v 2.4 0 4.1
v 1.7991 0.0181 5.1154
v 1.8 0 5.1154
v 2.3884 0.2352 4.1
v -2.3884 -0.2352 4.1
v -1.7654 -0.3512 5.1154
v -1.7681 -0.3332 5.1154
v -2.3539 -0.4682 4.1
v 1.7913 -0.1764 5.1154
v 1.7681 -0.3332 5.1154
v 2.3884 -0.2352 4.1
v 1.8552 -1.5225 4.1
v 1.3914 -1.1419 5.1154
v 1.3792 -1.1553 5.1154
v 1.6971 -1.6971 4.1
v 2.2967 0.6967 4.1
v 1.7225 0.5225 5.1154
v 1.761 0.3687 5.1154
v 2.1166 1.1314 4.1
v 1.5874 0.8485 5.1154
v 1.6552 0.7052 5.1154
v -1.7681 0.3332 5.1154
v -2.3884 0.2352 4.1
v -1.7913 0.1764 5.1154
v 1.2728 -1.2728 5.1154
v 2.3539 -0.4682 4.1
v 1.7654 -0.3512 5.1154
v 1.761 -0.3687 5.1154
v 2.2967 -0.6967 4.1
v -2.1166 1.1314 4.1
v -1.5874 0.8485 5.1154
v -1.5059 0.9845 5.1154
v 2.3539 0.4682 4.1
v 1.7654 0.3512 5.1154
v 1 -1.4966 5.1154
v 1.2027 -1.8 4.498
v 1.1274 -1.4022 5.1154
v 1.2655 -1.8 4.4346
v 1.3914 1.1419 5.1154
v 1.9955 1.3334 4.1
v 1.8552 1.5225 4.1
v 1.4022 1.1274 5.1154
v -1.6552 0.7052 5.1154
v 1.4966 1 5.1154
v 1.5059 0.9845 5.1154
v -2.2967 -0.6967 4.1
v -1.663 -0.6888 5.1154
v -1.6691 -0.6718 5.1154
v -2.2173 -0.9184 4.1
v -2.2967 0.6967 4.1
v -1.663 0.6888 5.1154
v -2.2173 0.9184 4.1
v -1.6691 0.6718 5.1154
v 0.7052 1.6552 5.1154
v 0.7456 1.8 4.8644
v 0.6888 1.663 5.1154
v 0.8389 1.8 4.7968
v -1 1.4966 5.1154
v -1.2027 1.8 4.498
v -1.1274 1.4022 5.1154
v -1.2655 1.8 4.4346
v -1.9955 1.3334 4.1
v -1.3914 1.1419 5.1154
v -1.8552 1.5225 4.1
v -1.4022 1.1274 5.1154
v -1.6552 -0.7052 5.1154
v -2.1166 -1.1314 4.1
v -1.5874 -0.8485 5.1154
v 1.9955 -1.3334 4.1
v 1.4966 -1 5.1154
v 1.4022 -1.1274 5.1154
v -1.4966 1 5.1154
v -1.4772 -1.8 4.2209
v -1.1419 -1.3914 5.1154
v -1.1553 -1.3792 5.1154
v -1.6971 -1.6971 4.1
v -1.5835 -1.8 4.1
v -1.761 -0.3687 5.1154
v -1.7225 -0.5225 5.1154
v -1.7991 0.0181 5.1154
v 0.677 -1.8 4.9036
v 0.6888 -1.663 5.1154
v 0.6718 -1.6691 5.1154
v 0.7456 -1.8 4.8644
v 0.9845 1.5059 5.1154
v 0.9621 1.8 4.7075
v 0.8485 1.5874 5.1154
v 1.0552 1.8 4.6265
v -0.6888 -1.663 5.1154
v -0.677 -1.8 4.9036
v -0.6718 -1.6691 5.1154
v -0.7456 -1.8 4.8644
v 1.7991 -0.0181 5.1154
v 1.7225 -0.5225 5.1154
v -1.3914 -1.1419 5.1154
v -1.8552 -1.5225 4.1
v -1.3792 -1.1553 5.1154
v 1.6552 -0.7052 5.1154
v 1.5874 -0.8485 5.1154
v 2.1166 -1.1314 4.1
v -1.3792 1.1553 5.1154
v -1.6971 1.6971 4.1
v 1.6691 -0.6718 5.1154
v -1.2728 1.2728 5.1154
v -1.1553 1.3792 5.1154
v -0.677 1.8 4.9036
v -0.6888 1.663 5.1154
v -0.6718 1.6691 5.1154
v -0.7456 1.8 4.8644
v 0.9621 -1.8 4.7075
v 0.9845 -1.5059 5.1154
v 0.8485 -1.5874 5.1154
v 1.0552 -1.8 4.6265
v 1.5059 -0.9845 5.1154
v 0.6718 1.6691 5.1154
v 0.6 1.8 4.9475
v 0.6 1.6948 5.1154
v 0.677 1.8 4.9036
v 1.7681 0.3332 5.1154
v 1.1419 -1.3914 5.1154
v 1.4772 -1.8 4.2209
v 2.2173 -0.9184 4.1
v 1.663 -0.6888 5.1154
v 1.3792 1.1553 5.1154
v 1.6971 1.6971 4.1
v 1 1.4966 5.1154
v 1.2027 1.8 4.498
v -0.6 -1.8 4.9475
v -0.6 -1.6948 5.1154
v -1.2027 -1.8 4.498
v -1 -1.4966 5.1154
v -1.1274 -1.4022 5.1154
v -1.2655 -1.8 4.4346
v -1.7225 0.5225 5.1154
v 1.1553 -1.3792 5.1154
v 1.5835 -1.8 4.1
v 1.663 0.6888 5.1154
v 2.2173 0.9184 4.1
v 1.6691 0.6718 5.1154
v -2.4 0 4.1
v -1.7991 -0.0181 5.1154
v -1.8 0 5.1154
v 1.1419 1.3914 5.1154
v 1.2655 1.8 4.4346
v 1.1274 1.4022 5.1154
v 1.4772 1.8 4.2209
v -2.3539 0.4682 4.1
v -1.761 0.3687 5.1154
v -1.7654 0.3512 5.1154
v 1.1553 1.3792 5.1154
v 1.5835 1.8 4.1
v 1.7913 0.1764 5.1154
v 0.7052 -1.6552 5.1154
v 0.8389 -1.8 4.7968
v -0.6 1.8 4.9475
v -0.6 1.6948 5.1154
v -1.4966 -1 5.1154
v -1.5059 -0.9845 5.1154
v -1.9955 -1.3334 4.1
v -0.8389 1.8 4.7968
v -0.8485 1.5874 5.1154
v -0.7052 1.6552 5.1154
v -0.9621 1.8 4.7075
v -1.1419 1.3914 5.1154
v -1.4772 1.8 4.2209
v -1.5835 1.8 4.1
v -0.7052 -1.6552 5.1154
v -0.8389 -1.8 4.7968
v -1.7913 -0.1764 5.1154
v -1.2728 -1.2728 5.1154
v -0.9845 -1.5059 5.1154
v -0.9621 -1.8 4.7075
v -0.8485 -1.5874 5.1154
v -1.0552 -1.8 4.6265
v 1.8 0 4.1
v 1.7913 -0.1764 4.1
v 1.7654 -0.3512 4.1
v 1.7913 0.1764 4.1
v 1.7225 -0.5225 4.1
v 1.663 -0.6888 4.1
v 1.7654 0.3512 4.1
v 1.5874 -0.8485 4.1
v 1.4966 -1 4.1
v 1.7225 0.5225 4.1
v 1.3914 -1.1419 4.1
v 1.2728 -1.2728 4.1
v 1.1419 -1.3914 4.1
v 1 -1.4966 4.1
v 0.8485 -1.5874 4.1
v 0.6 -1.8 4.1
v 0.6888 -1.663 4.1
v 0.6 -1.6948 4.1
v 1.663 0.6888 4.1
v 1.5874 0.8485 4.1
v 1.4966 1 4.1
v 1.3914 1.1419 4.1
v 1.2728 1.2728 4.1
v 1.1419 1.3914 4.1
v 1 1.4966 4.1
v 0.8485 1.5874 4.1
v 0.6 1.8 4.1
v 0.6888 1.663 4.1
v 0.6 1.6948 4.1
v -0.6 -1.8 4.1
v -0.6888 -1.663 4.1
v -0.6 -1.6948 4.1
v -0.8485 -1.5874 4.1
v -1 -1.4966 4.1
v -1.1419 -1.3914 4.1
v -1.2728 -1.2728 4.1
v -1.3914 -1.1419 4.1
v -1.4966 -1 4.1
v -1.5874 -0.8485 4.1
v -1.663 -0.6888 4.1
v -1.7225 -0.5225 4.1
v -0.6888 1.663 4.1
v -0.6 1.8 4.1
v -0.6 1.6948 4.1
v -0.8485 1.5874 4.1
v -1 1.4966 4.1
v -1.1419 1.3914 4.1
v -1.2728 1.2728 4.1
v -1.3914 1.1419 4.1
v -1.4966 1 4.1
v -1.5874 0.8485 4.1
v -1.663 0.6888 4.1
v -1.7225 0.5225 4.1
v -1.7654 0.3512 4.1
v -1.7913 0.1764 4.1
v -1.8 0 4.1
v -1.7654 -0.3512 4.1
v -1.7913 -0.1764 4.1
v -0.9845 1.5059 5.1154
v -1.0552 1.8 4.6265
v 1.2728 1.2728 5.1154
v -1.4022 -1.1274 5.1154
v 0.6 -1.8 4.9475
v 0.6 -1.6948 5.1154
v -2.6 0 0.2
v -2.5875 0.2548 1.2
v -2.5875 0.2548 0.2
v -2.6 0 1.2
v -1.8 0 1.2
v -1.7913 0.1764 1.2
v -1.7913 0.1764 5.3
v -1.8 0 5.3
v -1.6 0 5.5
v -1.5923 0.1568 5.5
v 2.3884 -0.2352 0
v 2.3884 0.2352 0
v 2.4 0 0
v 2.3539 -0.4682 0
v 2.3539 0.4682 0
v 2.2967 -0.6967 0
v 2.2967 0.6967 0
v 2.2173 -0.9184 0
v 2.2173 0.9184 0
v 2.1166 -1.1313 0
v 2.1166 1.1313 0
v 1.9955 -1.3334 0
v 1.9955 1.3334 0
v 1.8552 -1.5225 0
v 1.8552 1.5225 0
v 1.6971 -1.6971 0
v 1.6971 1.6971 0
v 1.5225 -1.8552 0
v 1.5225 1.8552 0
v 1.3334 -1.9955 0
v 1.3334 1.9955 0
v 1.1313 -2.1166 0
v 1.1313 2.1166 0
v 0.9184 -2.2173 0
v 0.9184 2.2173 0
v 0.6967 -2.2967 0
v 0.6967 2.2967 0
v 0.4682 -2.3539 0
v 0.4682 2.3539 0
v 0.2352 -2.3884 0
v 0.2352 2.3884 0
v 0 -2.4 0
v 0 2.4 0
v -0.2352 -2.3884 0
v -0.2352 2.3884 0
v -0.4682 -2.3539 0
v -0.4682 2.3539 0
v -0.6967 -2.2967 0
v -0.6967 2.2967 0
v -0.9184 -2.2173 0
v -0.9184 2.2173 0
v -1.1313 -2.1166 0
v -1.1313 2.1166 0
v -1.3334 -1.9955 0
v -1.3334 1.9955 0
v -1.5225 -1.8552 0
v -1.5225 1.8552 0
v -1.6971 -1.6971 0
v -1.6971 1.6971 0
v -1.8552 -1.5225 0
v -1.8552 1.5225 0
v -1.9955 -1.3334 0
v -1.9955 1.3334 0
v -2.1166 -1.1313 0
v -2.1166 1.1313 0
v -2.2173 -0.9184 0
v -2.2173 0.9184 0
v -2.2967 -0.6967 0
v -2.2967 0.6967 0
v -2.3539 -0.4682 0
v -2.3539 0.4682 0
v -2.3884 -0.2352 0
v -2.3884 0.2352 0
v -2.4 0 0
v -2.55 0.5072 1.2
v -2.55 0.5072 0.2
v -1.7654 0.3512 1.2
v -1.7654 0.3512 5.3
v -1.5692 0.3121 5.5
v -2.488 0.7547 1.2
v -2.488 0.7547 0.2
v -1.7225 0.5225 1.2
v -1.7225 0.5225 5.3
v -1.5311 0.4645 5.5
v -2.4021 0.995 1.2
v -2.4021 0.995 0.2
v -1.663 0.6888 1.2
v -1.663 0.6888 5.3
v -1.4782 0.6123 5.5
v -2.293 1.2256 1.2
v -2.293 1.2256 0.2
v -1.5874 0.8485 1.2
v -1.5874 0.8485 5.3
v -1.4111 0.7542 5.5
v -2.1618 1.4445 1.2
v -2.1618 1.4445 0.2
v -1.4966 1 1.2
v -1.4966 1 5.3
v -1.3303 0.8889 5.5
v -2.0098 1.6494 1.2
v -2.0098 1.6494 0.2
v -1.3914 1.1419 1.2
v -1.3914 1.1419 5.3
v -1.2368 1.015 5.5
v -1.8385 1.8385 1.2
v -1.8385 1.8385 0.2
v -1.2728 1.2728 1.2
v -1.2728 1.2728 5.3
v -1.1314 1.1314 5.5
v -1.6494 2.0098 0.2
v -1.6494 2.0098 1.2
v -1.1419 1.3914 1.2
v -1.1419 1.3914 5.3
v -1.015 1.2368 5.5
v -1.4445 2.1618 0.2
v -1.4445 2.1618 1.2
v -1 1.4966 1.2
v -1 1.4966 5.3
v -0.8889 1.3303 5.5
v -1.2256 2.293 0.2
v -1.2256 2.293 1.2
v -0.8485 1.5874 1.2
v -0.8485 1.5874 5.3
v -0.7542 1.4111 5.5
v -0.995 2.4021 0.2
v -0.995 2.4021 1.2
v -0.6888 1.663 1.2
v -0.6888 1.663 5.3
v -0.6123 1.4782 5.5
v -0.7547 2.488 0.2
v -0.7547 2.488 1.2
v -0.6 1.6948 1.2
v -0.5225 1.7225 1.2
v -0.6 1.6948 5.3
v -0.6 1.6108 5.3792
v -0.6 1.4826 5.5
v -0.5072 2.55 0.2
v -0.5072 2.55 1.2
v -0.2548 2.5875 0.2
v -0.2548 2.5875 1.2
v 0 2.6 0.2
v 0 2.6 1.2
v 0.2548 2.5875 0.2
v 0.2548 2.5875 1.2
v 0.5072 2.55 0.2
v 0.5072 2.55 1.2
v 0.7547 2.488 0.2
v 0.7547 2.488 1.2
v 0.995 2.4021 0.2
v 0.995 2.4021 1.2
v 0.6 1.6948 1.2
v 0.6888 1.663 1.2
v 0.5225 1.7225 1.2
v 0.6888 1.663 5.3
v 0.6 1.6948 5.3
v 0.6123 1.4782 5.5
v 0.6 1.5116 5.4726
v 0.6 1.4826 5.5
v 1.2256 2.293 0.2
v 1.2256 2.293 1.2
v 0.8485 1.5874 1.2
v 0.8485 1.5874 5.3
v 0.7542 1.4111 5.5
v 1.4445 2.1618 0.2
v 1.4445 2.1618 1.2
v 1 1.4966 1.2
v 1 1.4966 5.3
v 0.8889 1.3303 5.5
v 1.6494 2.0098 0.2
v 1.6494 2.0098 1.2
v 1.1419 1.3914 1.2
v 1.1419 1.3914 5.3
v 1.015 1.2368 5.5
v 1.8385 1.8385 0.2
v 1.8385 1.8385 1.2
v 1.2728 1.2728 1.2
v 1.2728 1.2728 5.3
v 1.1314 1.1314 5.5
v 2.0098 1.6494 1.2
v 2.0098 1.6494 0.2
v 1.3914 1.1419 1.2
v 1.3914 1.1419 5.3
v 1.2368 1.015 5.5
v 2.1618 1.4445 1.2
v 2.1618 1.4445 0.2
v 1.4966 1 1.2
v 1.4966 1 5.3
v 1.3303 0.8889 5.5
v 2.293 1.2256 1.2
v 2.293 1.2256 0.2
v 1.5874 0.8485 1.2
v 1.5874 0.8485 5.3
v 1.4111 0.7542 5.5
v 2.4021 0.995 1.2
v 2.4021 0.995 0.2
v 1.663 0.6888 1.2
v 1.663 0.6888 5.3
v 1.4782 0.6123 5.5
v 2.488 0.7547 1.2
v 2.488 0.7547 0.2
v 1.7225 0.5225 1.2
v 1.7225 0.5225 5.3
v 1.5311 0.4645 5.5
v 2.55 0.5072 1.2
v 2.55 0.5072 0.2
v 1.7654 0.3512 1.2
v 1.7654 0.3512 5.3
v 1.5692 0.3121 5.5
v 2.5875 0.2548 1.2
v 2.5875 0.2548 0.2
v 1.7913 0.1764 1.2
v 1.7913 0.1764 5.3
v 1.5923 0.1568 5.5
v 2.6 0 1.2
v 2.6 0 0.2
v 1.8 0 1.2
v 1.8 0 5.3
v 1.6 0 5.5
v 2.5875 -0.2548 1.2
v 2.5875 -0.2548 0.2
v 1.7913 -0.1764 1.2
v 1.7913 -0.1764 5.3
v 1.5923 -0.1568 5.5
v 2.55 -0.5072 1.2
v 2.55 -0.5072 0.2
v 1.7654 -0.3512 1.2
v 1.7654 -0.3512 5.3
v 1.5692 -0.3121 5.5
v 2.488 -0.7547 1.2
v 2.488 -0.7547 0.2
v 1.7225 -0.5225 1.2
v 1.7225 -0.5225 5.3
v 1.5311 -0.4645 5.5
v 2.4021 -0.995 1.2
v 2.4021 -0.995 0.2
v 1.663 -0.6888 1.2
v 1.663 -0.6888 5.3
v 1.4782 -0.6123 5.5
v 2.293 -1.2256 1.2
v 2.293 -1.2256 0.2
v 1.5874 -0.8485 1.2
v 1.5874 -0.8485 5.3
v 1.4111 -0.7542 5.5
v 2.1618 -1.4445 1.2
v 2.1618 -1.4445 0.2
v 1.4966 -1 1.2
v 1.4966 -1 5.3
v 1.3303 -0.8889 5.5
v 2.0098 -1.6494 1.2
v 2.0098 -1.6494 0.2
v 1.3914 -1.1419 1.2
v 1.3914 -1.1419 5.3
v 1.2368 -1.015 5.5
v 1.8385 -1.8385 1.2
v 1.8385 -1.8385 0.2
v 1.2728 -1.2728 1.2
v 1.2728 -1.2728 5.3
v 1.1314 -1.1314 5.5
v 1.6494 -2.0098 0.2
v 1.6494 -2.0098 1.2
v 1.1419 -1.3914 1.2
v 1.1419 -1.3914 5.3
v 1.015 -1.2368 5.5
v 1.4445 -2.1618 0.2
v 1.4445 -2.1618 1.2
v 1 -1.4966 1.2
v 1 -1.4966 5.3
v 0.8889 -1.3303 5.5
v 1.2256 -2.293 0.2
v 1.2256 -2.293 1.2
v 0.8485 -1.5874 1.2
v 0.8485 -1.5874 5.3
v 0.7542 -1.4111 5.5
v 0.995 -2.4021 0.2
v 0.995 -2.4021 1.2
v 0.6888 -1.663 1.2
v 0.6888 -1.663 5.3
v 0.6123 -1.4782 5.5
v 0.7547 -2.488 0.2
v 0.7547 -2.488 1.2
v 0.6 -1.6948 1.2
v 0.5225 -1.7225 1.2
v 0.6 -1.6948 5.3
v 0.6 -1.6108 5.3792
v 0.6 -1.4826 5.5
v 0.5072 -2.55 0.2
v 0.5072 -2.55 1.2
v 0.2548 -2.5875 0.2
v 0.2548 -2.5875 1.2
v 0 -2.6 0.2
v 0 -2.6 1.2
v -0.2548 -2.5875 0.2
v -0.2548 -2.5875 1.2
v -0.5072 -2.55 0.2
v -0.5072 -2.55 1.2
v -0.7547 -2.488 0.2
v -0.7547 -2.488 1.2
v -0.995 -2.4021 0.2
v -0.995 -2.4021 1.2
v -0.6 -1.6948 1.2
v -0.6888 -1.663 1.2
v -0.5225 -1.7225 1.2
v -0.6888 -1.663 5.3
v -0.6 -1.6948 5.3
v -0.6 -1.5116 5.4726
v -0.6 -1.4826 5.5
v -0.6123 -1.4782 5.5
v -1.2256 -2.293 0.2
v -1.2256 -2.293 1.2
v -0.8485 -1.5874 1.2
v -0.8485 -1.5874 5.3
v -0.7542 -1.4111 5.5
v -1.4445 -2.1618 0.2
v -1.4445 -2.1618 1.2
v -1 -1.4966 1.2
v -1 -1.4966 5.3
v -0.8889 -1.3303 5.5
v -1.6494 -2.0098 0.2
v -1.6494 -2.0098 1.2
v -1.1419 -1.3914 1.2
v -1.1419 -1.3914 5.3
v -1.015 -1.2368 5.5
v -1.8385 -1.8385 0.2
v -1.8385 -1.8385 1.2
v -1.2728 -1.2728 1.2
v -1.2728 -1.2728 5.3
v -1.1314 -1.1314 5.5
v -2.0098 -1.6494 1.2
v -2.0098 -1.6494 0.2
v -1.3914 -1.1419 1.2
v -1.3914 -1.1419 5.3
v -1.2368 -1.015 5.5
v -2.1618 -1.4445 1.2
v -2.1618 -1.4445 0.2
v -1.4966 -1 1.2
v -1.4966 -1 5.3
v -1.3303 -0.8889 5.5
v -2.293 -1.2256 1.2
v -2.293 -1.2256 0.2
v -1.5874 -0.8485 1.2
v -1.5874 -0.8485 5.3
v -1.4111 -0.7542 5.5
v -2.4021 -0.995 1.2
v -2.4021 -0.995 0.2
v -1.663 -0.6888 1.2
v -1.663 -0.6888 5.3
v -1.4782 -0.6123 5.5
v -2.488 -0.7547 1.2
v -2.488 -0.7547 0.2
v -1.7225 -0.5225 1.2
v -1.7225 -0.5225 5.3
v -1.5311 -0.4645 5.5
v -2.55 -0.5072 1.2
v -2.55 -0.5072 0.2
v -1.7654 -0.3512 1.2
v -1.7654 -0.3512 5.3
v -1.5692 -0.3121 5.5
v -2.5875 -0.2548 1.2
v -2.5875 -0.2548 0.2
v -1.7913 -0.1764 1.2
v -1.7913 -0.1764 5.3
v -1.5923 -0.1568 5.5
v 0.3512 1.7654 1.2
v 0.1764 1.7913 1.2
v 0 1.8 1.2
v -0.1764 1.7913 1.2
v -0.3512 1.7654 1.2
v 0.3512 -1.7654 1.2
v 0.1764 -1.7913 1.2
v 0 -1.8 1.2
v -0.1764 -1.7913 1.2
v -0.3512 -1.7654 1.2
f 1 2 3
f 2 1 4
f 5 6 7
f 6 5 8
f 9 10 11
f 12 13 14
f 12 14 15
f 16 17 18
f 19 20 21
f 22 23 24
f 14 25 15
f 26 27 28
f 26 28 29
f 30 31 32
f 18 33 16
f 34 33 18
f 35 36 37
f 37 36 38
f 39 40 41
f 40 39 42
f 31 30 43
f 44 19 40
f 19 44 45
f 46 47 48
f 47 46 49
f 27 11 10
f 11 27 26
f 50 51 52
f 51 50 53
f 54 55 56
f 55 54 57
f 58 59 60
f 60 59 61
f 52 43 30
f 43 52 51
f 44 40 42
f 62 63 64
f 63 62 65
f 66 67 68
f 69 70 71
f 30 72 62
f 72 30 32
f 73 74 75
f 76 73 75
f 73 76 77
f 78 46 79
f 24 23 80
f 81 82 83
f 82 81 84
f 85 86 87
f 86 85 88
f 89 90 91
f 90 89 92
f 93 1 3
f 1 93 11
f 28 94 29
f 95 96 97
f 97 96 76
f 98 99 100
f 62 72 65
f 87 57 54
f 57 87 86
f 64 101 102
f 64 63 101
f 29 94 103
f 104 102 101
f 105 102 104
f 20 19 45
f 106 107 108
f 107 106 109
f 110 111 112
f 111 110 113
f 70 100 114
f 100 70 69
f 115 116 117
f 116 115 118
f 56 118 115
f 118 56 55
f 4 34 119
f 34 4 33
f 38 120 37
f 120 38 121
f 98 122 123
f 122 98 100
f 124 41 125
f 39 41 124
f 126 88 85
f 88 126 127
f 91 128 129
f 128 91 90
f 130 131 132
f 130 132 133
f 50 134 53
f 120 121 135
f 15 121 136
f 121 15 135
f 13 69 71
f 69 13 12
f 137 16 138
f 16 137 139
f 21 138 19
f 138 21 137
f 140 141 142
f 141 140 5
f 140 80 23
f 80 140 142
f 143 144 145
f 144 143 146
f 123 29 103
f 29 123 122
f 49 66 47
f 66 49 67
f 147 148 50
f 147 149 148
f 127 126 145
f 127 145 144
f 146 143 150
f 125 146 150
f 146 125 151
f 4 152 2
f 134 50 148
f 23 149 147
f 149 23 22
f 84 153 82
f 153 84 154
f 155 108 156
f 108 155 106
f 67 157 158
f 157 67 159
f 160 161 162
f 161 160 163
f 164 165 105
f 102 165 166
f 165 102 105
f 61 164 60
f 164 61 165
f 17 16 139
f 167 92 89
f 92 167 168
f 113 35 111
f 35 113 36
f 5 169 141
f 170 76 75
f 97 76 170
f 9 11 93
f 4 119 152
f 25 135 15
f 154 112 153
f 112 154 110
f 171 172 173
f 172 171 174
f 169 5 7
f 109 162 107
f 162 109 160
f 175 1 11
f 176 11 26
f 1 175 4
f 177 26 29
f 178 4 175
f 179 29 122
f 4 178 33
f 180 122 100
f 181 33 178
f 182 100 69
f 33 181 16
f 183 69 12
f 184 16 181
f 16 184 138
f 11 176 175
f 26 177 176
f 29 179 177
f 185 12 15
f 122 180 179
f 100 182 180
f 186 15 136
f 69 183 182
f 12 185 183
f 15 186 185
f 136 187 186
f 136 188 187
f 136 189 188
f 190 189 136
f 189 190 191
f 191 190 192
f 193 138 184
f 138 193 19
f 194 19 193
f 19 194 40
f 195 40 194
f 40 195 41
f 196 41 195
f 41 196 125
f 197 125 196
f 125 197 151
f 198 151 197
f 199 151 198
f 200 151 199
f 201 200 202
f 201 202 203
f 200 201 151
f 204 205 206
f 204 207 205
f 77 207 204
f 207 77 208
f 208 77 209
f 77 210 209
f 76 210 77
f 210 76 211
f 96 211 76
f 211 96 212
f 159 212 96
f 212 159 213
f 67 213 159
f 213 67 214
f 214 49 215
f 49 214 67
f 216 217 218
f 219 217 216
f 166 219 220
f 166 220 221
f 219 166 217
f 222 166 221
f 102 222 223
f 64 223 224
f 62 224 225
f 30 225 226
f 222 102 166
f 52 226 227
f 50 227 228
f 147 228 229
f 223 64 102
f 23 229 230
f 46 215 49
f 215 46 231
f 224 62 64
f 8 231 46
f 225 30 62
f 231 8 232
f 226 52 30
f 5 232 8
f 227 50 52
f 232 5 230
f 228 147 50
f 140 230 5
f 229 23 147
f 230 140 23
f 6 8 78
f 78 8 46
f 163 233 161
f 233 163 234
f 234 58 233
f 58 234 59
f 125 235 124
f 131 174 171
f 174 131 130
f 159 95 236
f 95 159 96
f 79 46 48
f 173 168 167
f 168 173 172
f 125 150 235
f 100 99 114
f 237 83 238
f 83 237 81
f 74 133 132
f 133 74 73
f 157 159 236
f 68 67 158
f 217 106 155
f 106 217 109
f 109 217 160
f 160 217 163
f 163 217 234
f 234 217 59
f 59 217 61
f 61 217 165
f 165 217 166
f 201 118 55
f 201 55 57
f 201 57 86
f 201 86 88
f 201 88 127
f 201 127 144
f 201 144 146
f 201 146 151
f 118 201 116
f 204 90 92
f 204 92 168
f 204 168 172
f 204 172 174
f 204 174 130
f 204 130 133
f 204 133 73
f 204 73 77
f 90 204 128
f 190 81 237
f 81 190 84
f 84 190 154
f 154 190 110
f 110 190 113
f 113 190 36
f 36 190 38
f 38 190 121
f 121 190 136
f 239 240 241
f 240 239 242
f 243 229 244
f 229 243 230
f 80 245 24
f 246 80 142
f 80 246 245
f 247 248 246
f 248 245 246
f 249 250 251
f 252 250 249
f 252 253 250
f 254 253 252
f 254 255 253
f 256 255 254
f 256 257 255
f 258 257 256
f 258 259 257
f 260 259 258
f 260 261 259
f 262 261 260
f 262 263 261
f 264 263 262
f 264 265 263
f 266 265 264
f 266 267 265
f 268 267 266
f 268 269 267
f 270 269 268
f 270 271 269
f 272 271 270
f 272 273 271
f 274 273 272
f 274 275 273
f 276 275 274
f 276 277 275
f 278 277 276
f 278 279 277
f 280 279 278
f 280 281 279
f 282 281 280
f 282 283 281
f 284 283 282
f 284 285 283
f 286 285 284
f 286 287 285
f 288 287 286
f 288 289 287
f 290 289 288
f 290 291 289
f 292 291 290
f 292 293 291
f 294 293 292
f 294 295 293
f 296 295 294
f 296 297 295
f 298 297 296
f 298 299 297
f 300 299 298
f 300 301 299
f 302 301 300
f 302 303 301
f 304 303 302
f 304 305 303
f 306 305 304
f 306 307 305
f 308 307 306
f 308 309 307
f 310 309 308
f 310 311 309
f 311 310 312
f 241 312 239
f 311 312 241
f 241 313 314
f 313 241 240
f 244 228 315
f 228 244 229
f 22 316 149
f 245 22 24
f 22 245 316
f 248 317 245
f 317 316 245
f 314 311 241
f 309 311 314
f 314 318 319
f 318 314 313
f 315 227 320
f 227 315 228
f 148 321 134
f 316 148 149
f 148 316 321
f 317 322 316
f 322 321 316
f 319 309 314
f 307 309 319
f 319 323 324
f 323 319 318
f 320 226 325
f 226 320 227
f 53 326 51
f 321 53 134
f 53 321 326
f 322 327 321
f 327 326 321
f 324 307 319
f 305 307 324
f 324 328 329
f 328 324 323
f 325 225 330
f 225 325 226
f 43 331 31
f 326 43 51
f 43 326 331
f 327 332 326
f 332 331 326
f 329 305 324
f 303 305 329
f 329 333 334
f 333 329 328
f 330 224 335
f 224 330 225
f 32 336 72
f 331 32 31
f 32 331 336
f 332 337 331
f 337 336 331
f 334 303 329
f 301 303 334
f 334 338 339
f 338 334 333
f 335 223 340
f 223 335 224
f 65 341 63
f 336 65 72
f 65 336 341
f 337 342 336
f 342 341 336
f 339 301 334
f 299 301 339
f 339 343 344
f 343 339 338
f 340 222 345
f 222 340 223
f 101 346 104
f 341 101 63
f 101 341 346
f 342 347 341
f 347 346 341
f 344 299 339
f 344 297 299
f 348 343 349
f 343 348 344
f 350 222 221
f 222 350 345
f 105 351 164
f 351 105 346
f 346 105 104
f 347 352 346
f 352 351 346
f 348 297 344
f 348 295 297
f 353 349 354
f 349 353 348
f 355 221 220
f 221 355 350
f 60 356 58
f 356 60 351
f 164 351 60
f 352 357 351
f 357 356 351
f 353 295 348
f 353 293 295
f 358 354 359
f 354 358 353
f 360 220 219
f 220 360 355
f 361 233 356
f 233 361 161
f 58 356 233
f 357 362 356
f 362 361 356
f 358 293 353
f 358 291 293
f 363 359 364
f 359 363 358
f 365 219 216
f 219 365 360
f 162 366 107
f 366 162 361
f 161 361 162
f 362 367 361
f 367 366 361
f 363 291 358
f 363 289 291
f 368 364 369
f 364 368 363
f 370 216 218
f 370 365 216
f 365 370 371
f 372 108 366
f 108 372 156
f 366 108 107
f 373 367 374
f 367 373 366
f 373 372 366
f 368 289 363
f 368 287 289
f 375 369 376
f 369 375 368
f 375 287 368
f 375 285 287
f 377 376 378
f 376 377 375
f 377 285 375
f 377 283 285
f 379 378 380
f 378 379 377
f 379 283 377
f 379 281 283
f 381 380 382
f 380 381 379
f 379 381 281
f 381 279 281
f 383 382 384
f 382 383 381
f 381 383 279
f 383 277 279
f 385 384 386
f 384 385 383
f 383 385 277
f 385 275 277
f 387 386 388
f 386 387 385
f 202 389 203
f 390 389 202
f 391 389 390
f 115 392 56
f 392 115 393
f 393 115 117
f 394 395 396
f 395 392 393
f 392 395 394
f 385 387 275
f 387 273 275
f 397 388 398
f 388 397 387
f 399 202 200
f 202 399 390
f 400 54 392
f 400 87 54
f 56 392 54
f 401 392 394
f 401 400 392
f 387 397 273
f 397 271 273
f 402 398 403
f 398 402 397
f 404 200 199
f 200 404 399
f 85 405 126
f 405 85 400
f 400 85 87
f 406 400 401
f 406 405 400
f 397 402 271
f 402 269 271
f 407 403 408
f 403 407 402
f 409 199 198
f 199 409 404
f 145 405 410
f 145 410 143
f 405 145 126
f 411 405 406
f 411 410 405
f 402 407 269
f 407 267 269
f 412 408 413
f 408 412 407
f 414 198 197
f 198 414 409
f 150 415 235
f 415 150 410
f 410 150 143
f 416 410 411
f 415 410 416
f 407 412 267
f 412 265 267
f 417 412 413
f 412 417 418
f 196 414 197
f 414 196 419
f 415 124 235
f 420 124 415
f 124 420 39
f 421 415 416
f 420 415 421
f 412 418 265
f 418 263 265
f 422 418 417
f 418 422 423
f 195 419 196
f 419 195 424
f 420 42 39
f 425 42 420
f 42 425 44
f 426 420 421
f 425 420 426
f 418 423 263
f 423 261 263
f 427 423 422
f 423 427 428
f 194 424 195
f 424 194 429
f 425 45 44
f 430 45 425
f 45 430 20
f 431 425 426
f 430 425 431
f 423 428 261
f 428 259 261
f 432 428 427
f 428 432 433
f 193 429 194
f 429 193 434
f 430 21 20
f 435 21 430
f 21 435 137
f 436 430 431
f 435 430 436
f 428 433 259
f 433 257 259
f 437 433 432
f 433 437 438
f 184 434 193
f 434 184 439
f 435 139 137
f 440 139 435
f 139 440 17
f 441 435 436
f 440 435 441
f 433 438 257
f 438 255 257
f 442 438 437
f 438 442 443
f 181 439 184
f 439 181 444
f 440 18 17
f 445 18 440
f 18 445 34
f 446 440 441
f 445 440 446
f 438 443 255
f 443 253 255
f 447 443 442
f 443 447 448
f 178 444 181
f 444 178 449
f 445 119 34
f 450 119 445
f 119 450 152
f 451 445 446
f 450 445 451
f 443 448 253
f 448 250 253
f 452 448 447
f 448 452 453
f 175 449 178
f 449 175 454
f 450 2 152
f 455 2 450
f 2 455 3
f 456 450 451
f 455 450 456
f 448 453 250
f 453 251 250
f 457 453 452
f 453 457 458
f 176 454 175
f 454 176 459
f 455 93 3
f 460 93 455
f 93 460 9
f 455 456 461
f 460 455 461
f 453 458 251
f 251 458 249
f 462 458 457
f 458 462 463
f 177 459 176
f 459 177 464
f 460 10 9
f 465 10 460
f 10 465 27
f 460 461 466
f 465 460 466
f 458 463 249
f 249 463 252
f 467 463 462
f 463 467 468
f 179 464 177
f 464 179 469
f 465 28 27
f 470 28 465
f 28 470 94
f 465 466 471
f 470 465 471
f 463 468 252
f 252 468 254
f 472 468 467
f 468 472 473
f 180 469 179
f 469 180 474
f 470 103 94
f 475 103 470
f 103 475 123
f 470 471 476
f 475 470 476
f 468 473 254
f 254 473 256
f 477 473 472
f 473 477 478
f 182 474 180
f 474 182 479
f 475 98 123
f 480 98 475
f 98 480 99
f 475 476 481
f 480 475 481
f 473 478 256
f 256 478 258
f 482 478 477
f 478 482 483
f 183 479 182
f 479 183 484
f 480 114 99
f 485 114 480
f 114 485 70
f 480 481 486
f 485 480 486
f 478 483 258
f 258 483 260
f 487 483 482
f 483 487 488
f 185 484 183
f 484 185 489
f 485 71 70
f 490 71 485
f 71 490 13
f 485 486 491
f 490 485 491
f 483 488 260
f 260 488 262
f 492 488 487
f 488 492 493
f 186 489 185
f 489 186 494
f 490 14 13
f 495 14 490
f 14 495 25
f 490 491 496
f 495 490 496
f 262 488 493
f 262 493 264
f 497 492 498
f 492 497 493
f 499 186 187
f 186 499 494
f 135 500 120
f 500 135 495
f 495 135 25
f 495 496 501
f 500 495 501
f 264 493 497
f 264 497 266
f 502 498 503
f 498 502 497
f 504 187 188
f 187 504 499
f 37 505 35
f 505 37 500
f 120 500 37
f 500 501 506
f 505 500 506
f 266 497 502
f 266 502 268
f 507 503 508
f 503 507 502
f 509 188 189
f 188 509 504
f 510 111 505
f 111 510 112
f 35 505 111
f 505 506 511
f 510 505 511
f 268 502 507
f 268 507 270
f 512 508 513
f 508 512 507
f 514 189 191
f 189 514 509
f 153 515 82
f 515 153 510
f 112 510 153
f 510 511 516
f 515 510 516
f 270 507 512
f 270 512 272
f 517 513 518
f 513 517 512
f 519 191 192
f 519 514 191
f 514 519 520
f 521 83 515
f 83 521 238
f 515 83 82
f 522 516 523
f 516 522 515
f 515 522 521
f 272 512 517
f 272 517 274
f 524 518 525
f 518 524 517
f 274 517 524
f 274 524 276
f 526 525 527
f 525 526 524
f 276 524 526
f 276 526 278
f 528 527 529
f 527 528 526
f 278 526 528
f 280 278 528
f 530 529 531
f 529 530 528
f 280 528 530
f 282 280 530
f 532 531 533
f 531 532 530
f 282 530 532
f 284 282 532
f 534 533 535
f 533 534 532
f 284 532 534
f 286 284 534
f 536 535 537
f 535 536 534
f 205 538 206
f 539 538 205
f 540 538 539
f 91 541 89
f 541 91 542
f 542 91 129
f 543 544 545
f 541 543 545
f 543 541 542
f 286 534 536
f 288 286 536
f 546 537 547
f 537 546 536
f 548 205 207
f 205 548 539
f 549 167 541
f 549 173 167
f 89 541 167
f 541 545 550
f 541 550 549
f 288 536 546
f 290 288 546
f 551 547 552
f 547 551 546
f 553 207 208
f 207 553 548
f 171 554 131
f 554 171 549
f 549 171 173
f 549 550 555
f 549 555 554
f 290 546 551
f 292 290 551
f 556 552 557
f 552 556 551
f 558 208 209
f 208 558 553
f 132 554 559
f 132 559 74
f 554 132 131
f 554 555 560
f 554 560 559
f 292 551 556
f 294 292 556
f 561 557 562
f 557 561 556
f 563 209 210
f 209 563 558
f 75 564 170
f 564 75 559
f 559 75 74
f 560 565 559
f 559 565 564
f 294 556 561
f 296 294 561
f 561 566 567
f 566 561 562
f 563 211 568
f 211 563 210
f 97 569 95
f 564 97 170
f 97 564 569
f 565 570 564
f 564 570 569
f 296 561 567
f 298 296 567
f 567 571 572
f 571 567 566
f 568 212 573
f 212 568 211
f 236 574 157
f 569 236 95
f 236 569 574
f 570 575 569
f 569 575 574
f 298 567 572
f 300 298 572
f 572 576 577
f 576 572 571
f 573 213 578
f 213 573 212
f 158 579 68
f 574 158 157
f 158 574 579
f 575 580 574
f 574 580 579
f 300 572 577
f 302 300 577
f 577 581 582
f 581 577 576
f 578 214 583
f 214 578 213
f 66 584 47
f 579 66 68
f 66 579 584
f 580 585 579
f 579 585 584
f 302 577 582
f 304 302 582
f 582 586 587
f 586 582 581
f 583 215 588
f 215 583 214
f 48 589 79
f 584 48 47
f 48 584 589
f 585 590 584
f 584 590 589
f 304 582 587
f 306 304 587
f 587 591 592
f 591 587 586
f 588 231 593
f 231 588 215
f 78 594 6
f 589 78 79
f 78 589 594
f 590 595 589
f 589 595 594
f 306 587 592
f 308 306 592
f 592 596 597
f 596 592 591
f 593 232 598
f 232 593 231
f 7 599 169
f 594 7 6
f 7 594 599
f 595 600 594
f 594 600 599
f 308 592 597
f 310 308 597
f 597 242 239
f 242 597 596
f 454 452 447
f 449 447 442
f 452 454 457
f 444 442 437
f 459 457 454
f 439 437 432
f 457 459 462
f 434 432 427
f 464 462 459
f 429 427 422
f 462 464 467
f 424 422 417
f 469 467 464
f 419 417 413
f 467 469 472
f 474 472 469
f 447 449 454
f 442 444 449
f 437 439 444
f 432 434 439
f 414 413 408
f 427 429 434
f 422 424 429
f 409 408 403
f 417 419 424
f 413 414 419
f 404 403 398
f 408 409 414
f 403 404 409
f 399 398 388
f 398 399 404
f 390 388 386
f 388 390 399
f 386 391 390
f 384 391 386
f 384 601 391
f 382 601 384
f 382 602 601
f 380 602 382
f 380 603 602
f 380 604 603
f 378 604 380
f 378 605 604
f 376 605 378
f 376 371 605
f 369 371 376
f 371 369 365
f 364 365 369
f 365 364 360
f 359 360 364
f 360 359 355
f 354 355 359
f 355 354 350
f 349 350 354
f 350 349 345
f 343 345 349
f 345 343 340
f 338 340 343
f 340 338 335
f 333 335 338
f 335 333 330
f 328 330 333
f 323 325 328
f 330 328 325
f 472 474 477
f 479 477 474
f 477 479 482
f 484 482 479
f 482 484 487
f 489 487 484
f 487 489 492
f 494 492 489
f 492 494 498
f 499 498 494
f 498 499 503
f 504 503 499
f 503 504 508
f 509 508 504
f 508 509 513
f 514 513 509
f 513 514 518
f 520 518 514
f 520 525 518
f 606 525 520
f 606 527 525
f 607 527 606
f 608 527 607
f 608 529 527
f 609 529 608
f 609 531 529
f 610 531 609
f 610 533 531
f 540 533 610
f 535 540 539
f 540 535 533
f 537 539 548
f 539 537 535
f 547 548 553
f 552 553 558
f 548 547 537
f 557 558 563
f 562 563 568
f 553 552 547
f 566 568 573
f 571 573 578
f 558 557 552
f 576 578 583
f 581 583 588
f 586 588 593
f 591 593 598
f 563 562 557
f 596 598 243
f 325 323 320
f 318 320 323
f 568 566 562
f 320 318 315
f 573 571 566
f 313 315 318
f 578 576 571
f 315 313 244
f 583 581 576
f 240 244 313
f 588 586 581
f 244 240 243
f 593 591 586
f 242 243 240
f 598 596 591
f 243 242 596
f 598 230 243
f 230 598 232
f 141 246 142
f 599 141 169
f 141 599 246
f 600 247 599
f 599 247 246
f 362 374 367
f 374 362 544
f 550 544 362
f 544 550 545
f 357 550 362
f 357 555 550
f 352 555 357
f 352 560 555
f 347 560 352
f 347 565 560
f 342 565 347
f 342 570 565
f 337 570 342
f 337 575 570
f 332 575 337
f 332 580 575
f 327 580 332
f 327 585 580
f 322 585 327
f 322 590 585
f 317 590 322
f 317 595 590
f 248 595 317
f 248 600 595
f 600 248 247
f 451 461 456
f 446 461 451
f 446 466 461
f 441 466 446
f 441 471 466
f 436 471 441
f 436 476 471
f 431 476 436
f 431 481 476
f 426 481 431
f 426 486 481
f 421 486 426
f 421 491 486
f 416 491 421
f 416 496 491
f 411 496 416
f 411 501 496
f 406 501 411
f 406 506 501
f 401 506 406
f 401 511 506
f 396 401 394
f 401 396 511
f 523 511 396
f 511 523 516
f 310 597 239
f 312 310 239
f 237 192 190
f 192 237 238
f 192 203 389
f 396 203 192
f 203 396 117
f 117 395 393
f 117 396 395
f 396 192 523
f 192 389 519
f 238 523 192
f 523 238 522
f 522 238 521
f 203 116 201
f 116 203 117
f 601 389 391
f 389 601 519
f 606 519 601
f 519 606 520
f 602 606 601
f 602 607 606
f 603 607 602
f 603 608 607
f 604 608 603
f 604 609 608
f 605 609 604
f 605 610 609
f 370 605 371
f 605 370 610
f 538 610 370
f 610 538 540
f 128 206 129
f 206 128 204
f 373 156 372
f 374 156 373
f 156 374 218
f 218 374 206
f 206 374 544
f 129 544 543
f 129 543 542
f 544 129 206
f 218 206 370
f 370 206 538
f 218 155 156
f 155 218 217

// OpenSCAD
// Insert from outside the lid with the split-stem barbs facing left/right; no keeper or O-ring is needed.
// Dimensions are millimeters; print with the external head flat on the bed at Z = 0.
lid_thickness = 2.4; // Match the enclosure lid plate thickness.
lid_hole_diameter = 4; // Match the wake-button opening in the lid.
lid_relief_diameter = 5.4; // Match the underside clearance around the opening.
button_recess = 4; // Distance from lid exterior to the resting onboard switch top.
button_rest_gap = 0.2; // Clearance between the plunger tip and resting switch.
button_travel = 0.5; // Head-to-lid clearance at rest and maximum press stroke.

head_diameter = 5.2; // External head diameter; overlaps the hole to stop inward movement.
head_thickness = 1.2; // Head height, including the solid flexure root.
head_edge_chamfer = 0.2; // Bevel around the exposed head edge.
stem_diameter = 3.6; // Sliding stem diameter; smaller than the lid hole.
flex_slot_width = 1.2; // Gap between the two flexible halves, allowing them to squeeze together.
barb_diameter = 4.8; // Retaining width across X; slightly larger than the lid hole.
barb_ramp_height = 1.1; // Taper from the retaining shoulder toward the insertion tip.
tip_chamfer = 0.2; // Small bevel on the two switch-contact tips.

barb_shoulder_z = head_thickness + lid_thickness + button_travel; // Retaining shoulders in head-down print coordinates.
pin_height = head_thickness + button_travel + button_recess - button_rest_gap; // Tip position in head-down print coordinates.

assert(lid_thickness > 0 && button_recess > lid_thickness);
assert(button_rest_gap >= 0 && button_travel > button_rest_gap);
assert(head_diameter > lid_hole_diameter);
assert(head_edge_chamfer > 0 && head_edge_chamfer < head_thickness);
assert(stem_diameter > 0 && stem_diameter < lid_hole_diameter);
assert(flex_slot_width > barb_diameter - lid_hole_diameter
    && flex_slot_width < stem_diameter);
assert(barb_diameter > lid_hole_diameter && barb_diameter < lid_relief_diameter);
assert(barb_ramp_height > 0 && tip_chamfer > 0
    && barb_shoulder_z + barb_ramp_height < pin_height - tip_chamfer,
    "Barb ramps must finish before the switch-contact tips.");

module wake_button_pin() {
    difference() {
        union() {
            rotate_extrude($fn = 64)
                polygon([[0, 0],
                         [head_diameter / 2 - head_edge_chamfer, 0],
                         [head_diameter / 2, head_edge_chamfer],
                         [head_diameter / 2, head_thickness],
                         [stem_diameter / 2, head_thickness],
                         [stem_diameter / 2, pin_height - tip_chamfer],
                         [stem_diameter / 2 - tip_chamfer, pin_height],
                         [0, pin_height]]);
            intersection() {
                translate([0, 0, barb_shoulder_z])
                    cylinder(h = barb_ramp_height, d1 = barb_diameter,
                             d2 = stem_diameter - 0.1, $fn = 64);
                translate([-barb_diameter / 2, -stem_diameter / 2, barb_shoulder_z])
                    cube([barb_diameter, stem_diameter, barb_ramp_height]);
            }
        }
        translate([-flex_slot_width / 2, -head_diameter / 2 - 0.1, head_thickness])
            cube([flex_slot_width, head_diameter + 0.2, pin_height]);
    }
}

wake_button_pin();
